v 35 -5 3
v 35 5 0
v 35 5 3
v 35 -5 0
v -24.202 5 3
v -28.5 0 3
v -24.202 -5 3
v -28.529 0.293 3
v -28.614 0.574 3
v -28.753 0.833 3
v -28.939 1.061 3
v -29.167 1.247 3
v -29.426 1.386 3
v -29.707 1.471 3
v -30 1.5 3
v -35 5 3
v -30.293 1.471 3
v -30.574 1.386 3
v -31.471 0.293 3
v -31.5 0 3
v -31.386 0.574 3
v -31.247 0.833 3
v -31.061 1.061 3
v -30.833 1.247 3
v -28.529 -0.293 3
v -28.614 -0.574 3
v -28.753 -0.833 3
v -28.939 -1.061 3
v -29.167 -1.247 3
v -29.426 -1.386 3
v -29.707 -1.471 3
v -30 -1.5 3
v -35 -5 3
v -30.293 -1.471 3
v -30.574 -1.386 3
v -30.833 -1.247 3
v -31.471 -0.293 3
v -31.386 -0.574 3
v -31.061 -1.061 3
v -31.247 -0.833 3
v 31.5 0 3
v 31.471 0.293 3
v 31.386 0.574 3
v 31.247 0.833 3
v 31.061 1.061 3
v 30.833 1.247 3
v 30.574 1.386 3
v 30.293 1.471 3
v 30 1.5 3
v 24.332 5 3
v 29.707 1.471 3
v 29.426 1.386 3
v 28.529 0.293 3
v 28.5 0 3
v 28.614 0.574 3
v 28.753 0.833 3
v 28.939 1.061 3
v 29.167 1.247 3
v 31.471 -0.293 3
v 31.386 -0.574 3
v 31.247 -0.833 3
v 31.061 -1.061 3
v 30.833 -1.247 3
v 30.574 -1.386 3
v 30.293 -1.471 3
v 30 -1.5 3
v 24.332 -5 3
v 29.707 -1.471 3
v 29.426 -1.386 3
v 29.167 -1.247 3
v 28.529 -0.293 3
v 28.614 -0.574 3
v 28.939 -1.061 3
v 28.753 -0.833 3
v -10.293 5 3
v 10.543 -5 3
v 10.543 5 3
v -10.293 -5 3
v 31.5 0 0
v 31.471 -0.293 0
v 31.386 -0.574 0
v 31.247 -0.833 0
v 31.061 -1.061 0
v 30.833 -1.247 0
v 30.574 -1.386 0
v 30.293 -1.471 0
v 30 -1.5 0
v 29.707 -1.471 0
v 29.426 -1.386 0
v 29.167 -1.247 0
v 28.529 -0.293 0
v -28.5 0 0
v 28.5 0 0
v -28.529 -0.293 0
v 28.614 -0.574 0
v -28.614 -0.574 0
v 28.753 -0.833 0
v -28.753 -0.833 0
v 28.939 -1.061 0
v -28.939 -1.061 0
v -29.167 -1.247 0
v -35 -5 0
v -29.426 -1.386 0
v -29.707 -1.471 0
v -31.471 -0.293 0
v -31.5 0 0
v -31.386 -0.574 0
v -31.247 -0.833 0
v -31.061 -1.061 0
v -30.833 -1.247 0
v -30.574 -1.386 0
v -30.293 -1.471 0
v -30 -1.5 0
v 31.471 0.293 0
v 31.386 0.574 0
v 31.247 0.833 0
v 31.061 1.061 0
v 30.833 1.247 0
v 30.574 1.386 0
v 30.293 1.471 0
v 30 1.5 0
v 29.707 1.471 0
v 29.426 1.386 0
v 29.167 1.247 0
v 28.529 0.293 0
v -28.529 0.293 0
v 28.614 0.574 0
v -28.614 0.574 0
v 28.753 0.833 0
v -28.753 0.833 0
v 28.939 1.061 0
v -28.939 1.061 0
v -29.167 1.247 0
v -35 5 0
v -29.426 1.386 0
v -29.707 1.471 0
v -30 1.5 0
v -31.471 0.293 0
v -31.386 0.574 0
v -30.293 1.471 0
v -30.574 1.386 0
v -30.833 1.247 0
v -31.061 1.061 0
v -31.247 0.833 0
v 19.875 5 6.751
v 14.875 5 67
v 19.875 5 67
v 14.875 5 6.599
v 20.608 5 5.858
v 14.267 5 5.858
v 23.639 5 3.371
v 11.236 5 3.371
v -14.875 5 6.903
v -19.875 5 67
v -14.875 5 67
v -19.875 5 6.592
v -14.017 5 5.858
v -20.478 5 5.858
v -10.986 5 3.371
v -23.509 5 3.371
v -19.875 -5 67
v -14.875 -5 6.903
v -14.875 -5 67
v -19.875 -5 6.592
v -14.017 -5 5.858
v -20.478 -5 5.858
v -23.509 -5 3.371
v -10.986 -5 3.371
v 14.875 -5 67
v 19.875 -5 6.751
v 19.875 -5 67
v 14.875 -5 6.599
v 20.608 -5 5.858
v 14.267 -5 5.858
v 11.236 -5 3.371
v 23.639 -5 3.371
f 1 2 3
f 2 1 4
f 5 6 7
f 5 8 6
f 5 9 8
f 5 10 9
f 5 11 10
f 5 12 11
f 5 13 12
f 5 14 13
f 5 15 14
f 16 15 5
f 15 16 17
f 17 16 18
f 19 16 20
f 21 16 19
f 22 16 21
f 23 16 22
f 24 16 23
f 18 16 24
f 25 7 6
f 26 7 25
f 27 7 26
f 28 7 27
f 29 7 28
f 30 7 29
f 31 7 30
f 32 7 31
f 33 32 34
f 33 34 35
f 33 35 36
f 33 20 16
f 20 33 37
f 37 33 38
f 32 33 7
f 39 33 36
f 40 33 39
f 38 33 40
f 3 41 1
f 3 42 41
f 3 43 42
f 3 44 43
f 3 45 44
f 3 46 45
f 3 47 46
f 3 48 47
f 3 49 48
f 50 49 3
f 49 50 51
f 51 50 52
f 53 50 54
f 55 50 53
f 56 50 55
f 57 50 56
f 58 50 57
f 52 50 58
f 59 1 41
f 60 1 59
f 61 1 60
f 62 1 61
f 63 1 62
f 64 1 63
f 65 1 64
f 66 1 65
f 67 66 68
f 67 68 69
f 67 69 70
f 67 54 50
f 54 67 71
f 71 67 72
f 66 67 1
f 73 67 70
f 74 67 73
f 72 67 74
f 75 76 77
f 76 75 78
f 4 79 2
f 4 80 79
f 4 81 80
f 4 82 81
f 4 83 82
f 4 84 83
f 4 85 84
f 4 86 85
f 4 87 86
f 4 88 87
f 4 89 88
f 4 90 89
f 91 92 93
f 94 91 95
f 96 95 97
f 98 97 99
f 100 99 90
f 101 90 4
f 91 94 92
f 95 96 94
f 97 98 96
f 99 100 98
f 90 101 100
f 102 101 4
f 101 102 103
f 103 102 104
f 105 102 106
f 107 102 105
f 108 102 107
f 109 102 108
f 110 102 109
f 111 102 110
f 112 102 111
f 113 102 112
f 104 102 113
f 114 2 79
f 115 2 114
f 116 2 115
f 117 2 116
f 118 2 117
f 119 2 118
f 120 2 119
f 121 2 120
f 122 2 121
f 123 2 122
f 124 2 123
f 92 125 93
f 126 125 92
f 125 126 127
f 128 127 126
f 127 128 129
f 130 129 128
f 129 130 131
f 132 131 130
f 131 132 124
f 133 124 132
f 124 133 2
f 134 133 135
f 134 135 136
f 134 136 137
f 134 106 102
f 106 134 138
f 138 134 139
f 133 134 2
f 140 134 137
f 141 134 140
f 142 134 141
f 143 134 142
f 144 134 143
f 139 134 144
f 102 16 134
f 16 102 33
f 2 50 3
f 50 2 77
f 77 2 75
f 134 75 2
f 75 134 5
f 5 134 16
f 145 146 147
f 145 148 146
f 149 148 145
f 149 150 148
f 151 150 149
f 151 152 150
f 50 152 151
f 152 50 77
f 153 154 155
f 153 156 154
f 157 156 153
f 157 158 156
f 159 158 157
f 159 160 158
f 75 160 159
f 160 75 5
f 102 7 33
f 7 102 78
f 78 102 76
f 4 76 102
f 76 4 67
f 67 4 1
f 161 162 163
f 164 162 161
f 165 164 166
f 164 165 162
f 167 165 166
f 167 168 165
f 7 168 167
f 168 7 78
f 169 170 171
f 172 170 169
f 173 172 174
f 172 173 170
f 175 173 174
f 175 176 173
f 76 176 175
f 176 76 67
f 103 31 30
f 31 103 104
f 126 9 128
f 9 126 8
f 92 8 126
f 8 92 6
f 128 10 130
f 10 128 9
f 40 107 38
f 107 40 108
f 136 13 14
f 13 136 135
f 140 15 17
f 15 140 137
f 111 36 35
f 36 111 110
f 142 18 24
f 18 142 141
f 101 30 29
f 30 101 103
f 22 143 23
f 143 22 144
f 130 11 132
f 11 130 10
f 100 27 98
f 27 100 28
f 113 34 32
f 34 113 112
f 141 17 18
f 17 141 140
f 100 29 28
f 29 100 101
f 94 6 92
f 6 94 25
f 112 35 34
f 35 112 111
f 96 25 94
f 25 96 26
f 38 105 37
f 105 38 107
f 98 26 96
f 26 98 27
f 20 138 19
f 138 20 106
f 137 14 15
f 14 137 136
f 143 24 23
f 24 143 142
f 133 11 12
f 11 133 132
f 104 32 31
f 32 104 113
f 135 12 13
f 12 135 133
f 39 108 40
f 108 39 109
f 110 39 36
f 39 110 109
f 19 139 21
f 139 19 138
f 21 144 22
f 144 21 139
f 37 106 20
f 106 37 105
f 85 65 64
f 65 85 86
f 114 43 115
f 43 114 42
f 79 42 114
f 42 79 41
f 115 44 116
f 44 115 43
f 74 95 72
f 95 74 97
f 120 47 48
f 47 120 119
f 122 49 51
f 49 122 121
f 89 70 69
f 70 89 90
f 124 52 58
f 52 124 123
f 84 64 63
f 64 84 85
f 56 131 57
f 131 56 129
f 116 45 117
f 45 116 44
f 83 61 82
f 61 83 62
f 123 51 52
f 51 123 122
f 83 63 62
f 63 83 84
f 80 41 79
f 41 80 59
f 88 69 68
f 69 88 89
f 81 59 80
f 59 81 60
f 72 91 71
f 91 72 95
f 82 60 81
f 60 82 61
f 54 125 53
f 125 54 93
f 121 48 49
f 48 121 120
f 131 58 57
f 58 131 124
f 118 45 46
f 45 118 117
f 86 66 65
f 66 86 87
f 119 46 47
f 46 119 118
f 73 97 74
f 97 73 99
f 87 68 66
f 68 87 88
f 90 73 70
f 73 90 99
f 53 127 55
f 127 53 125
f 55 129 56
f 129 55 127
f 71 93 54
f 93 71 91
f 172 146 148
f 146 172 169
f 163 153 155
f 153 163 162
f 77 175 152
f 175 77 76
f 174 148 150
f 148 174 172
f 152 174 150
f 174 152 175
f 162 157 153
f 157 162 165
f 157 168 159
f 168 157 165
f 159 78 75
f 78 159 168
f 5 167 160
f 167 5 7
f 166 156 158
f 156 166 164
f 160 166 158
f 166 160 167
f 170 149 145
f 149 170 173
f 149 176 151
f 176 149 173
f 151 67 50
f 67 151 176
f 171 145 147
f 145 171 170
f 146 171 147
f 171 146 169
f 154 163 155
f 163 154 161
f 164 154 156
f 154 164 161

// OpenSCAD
width=70;
height=10;
depth=3;
holeRadius=3/2;

deskThickness=29.75;
deskDropback=12;

vertDepth=55+deskDropback;
vertWidth=5;
vertHeight=height;

//Main support
translate([-width/2, -height/2,0])
{
    difference(){
        margin=5;
        cube([width, height, depth]);
        
        //Screw holes
        //Left
        translate([margin,margin,-1]){
            cylinder(r=holeRadius, h=depth*2, $fn=32);
        }
        //Right
        translate([width-margin,height-margin,-1]){
            cylinder(r=holeRadius, h=depth*2, $fn=32);
        }
    }
}


//Right vert
translate([(deskThickness/2), -vertHeight/2, 0]){
    cube([vertWidth,vertHeight,vertDepth]);
}

//Left vert
translate([-(deskThickness/2)-(vertHeight/2), -vertHeight/2, 0]){
    cube([vertWidth,vertHeight,vertDepth]);
}


//Inside Bevels
translate([-deskThickness/2,-vertHeight/2,0]){
    difference(){
        cube([deskThickness, vertHeight,10]);
        rotate([90,0,0]){
            translate([15,20,-12]){
                cylinder(r=20,h=vertHeight*2, $fn=32);}
        }
    }
}

//Outside Left Bevel
translate([-deskThickness-19.87,-vertHeight/2,0]){
    difference(){
        cube([deskThickness, vertHeight,10]);
        rotate([90,0,0]){
            translate([15,20,-12]){
                cylinder(r=20,h=vertHeight*2, $fn=32);
            }
        }
        
        translate([-5,-1,-1]){
            cube([30,100,100]);
        }
    }
    
                 
}

//Outside Right Bevel
translate([deskThickness-20+vertHeight,-vertHeight/2,0]){
    difference(){
        cube([deskThickness, vertHeight,10]);
        rotate([90,0,0]){
            translate([15,20,-12]){
                cylinder(r=20,h=vertHeight*2, $fn=32);  
            }
        }
        
        translate([8,-1,-1]){
            cube([30,100,100]);
        }
    }
    
                 
}
